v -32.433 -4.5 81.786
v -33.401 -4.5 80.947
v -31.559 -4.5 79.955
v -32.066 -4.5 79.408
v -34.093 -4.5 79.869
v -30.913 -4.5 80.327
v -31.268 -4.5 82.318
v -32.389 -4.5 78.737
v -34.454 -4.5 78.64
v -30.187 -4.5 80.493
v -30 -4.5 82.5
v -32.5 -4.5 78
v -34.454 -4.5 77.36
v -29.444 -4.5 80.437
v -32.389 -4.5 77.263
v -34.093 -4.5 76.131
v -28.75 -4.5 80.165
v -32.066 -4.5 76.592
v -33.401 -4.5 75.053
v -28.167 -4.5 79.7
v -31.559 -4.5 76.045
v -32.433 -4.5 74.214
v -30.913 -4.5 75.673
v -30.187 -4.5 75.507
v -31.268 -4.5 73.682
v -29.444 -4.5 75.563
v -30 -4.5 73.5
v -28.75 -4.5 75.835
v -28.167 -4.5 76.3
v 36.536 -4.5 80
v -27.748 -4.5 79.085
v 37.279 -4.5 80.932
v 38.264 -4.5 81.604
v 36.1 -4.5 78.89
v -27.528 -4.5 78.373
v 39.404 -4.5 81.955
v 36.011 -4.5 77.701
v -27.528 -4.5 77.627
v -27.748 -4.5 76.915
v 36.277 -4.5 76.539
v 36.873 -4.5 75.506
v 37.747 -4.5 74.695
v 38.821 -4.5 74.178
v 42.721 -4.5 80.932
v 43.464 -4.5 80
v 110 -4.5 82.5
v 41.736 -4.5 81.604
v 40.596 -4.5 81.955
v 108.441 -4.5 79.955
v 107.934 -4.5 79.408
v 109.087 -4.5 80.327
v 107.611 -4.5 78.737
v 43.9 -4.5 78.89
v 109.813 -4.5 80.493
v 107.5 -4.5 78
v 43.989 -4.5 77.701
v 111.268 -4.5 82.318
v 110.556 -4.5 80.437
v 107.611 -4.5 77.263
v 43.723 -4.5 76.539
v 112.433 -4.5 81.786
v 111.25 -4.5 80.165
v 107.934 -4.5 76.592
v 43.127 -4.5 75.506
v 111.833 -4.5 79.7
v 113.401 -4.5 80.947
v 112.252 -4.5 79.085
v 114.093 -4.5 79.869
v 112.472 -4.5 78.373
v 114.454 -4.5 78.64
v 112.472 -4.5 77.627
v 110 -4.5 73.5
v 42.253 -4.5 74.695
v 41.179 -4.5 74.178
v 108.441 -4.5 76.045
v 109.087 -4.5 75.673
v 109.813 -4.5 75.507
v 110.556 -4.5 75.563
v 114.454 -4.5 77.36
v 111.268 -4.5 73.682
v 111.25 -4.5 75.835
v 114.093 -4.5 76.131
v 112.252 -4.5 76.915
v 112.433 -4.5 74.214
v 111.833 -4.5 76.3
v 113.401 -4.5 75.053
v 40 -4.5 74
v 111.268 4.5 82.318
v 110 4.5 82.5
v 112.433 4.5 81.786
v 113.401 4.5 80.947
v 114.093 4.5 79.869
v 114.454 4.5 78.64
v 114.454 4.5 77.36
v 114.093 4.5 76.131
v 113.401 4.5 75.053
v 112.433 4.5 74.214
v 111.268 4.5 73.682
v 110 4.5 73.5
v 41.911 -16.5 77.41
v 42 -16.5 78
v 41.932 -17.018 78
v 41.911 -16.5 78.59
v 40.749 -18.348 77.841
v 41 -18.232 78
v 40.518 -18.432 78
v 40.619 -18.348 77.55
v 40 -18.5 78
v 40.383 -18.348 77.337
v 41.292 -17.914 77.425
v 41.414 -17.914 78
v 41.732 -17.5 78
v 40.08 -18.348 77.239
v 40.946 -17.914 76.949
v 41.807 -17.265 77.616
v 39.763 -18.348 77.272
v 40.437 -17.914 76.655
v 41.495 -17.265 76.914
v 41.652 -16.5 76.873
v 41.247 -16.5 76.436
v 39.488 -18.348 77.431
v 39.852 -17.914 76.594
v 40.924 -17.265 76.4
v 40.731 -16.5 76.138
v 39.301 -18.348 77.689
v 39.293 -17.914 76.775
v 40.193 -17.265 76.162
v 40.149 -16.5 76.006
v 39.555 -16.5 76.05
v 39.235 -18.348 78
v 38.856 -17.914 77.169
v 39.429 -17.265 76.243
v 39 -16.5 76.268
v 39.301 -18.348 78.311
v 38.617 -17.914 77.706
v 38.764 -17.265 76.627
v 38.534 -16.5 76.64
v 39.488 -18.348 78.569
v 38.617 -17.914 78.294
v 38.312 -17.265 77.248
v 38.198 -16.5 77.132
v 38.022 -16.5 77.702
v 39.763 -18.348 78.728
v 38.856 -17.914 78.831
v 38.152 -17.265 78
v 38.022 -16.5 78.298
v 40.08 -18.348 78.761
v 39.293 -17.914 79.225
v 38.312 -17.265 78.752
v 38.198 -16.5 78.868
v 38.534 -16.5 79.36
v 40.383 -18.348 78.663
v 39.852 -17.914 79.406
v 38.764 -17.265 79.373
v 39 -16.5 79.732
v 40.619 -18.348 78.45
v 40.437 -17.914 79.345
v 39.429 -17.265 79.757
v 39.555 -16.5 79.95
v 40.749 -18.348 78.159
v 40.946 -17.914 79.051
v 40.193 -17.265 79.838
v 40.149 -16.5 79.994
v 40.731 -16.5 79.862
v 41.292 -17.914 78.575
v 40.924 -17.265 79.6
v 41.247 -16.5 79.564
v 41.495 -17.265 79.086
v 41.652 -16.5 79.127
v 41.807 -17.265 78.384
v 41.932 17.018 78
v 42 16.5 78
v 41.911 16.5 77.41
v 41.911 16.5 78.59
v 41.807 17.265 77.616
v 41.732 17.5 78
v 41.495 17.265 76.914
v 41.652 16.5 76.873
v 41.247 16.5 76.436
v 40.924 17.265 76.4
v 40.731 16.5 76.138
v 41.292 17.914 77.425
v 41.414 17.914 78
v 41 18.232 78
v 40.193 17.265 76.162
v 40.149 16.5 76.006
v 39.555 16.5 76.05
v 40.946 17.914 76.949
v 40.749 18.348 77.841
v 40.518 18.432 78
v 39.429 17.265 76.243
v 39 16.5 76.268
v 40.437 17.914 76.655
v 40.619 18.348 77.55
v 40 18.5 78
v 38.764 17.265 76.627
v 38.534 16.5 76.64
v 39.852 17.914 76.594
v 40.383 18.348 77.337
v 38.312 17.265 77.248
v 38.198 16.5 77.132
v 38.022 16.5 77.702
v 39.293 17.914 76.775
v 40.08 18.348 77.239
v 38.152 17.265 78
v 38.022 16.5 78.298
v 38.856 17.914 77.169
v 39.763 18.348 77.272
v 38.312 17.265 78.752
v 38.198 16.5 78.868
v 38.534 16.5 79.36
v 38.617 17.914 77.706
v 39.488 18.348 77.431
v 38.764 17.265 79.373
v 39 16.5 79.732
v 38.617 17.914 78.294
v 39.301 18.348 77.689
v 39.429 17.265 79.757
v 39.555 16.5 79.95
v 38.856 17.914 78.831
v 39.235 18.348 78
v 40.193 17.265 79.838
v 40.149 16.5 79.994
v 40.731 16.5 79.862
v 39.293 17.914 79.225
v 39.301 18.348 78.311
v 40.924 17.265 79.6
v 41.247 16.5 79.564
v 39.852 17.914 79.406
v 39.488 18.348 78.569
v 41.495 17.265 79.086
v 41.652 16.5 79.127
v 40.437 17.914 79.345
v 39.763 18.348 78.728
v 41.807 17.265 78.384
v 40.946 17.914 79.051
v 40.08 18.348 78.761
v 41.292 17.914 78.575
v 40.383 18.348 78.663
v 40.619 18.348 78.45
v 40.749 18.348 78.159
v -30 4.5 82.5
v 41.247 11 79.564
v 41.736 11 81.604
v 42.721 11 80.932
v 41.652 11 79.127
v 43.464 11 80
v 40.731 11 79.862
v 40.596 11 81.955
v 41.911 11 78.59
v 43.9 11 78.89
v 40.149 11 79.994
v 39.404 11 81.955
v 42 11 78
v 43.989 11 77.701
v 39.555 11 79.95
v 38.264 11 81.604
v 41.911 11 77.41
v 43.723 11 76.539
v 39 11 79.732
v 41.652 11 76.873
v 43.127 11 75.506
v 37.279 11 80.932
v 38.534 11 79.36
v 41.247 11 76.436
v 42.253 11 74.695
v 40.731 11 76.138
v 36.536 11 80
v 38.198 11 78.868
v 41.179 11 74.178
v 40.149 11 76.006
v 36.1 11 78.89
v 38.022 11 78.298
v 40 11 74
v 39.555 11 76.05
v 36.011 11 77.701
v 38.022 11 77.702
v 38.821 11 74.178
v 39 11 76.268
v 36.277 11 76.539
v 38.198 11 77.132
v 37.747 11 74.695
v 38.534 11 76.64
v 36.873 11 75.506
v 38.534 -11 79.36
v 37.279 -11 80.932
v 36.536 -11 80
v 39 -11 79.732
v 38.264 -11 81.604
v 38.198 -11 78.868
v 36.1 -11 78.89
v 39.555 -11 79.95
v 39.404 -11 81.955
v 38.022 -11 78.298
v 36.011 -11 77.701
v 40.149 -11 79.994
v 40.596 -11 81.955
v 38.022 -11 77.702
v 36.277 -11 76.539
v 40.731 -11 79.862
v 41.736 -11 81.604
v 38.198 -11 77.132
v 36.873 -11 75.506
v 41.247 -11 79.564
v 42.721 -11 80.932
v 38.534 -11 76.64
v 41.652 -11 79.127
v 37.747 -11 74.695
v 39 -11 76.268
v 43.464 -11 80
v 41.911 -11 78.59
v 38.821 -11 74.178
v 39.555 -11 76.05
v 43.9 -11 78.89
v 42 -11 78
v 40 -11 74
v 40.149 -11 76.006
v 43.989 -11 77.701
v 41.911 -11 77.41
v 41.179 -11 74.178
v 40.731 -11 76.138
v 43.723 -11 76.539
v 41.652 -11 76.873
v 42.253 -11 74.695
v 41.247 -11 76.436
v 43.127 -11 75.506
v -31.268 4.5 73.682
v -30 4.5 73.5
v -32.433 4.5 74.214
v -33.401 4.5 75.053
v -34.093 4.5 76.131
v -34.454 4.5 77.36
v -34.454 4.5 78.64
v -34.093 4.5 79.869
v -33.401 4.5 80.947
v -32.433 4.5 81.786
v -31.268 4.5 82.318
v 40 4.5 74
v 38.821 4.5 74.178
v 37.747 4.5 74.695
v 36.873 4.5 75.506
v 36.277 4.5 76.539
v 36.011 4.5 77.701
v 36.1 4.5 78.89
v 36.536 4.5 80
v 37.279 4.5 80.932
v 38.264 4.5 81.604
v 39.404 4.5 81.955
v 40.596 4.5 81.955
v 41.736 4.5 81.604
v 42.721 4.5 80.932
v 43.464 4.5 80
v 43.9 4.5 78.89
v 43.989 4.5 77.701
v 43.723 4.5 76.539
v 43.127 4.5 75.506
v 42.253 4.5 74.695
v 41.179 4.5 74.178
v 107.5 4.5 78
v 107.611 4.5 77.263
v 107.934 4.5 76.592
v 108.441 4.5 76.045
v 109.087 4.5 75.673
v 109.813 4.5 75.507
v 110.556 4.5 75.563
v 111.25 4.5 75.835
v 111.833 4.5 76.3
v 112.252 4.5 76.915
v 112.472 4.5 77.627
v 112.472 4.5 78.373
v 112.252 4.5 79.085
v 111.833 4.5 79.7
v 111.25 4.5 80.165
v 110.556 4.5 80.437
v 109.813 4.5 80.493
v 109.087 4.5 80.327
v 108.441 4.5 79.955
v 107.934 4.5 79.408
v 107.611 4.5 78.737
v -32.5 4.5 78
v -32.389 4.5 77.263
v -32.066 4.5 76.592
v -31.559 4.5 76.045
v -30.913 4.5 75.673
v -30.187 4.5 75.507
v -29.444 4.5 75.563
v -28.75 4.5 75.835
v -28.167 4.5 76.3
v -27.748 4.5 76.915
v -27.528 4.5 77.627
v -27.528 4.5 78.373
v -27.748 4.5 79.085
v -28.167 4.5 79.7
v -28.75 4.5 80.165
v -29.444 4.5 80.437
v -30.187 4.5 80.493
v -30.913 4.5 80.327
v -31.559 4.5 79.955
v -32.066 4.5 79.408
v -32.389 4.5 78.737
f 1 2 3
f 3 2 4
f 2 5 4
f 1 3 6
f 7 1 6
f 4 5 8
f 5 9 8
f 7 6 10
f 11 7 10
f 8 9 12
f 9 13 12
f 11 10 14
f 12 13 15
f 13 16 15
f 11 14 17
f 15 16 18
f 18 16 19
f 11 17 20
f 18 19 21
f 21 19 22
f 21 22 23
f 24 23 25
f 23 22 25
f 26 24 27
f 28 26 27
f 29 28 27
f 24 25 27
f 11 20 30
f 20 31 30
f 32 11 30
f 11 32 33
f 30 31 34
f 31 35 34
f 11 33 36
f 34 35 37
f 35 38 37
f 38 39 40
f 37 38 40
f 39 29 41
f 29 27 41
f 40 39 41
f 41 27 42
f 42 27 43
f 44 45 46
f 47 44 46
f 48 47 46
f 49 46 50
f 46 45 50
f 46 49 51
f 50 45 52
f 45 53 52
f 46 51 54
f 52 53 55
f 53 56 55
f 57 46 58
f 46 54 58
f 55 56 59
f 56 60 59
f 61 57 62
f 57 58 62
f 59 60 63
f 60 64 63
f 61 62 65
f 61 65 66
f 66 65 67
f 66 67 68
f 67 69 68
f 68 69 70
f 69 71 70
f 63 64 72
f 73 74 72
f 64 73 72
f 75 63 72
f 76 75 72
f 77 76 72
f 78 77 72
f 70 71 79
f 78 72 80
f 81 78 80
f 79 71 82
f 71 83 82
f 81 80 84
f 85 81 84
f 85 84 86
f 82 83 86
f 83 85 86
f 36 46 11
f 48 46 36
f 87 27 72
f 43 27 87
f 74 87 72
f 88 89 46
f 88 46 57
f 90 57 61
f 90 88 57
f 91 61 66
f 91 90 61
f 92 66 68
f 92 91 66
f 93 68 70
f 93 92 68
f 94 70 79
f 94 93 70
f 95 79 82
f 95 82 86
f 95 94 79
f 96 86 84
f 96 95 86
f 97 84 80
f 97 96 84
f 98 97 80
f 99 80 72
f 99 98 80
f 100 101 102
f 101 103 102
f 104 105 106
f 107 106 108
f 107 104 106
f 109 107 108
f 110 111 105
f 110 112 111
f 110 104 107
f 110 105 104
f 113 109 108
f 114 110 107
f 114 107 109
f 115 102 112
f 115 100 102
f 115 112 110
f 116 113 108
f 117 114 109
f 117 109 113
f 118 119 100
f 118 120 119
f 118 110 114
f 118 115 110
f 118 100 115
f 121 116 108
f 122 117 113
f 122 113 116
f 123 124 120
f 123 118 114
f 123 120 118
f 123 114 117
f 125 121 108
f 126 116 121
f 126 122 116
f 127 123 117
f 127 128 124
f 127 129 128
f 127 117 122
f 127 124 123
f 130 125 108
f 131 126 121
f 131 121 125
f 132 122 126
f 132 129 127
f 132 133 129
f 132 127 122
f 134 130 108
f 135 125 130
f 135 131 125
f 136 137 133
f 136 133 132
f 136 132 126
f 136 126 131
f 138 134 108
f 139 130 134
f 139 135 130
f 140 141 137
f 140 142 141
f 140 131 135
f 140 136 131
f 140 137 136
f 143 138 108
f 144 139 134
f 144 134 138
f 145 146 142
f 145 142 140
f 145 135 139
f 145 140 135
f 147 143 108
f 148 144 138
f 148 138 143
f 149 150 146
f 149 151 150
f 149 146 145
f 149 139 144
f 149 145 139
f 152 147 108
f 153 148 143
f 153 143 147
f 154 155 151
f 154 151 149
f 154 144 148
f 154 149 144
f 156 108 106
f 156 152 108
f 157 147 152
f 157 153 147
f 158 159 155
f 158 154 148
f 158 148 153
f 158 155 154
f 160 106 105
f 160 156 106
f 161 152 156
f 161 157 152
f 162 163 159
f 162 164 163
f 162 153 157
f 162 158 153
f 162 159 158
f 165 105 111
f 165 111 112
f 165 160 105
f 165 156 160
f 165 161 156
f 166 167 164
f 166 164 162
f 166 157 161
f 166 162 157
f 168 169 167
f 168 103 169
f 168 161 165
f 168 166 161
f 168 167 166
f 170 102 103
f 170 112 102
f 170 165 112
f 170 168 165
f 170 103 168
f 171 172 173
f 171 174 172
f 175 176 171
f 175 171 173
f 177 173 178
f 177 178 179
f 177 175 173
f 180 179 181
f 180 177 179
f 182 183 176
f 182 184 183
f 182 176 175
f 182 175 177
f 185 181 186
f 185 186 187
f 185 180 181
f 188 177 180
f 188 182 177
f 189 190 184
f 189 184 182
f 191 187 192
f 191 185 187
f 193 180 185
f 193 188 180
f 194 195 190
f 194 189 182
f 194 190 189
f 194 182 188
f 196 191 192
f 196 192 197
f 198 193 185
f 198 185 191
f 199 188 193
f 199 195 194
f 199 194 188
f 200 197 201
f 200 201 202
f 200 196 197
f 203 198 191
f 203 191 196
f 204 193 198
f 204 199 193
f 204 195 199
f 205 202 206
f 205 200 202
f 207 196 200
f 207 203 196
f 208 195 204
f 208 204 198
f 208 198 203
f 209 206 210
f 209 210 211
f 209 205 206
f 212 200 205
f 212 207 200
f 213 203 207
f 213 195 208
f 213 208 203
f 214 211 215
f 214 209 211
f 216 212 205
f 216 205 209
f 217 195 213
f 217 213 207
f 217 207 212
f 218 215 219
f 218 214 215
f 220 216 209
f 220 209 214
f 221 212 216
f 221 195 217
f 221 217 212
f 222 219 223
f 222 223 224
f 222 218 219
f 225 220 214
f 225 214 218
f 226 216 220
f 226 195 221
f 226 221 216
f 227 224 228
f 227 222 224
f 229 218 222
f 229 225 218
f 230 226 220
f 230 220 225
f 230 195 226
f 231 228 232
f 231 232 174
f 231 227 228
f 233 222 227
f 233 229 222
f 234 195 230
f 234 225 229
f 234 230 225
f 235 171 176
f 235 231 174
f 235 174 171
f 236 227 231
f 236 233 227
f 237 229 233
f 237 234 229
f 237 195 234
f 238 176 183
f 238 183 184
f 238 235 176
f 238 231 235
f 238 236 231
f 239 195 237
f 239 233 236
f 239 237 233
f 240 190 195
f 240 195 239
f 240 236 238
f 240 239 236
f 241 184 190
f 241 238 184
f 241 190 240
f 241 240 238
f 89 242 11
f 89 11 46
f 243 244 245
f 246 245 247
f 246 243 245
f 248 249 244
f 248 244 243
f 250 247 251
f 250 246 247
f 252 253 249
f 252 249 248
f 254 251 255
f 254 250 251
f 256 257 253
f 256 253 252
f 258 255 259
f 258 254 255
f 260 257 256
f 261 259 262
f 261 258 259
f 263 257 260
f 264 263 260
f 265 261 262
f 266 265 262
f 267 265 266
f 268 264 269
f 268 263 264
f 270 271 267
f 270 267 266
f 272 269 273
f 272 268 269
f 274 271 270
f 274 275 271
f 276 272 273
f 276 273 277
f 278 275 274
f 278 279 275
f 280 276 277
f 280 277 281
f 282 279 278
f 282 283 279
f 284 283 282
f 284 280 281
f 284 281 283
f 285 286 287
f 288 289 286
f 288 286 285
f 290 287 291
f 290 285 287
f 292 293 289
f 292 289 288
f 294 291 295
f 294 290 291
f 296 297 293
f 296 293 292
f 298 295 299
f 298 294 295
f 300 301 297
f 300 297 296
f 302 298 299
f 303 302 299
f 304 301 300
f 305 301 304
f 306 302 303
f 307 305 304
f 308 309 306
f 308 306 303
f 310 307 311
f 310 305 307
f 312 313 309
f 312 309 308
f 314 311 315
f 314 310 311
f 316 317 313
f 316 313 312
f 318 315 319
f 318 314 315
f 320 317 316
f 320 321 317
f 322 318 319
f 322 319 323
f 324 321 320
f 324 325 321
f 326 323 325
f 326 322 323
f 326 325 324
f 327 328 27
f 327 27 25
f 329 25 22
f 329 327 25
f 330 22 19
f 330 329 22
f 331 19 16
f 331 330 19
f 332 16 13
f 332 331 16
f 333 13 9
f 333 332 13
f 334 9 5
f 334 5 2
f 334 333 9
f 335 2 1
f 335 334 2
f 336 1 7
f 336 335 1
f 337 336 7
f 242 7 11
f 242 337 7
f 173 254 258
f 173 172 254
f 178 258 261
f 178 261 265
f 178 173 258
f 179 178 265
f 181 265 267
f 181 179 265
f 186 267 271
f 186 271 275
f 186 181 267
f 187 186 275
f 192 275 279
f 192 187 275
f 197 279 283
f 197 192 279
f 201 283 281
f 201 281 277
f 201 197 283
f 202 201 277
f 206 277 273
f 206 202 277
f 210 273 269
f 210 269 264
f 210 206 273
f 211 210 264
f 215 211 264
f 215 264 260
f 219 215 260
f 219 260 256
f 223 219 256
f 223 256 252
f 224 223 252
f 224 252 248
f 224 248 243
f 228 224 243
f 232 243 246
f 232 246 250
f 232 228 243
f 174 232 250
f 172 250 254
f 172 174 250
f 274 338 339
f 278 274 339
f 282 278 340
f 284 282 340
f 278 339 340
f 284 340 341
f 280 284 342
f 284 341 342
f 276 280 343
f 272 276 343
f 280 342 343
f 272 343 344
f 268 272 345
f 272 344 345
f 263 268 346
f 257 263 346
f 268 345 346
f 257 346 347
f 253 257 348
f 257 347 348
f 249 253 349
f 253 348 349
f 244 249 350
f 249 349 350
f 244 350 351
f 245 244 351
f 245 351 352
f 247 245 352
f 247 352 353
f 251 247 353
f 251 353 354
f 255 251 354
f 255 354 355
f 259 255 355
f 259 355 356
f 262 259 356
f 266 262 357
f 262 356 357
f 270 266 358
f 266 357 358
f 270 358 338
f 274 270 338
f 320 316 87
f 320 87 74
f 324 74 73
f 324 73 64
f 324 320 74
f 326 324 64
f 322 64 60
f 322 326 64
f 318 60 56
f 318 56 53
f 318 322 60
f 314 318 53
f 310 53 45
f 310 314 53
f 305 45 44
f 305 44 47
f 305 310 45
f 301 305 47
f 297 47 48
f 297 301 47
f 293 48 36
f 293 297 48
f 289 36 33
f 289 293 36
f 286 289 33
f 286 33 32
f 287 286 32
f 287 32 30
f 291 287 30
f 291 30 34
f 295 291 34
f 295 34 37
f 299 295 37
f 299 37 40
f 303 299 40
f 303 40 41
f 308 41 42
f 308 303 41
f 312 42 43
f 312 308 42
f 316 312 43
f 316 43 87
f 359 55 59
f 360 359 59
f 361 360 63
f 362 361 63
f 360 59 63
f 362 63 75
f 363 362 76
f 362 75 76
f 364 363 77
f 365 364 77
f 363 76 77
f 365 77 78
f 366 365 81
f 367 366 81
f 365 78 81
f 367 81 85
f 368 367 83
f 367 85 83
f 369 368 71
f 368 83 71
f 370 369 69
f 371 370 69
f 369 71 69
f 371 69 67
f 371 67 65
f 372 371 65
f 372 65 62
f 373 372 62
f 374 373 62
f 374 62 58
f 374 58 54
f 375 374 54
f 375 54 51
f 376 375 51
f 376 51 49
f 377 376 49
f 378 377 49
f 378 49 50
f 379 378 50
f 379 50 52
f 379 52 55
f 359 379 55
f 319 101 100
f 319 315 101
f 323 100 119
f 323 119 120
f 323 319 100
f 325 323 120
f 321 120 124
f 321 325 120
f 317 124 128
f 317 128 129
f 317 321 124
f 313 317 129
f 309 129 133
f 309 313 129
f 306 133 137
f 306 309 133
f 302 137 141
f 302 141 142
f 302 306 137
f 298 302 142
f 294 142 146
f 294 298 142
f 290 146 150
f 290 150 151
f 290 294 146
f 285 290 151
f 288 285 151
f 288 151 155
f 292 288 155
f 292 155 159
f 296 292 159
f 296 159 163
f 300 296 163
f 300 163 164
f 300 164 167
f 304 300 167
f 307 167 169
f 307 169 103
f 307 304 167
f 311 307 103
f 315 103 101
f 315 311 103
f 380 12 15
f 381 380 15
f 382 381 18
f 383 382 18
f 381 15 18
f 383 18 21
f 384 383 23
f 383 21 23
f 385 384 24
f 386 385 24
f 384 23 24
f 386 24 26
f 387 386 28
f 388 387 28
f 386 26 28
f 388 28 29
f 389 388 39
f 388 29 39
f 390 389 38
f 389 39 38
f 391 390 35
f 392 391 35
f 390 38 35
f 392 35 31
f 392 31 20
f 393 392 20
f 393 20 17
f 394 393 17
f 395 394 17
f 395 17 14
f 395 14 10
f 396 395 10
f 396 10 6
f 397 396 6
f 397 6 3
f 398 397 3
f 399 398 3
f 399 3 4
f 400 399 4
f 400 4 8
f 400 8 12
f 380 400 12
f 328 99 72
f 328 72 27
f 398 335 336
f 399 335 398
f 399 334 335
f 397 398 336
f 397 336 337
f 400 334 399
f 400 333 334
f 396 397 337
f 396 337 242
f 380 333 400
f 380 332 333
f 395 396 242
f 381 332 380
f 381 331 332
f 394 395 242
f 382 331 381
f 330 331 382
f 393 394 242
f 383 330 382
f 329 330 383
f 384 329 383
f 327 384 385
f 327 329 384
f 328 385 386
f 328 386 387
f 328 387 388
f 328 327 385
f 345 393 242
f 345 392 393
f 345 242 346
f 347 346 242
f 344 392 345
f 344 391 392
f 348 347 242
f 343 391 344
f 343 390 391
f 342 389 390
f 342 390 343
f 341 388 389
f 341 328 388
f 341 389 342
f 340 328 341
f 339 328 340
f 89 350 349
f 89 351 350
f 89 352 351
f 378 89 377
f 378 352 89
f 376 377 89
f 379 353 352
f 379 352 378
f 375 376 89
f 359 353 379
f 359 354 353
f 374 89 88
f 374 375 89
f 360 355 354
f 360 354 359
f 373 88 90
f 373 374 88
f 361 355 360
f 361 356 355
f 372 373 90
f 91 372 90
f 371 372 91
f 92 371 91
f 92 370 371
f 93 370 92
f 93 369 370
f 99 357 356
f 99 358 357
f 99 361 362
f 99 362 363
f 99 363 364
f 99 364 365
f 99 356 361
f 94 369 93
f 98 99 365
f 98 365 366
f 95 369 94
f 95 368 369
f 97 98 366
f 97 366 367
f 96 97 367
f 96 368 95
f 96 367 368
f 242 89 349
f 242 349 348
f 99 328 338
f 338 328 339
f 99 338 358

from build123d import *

# Parameters (mm, degrees)
BOSS_EXTRUDE1_DEPTH          = 9
SKETCH2_R                    = 4
BOSS_EXTRUDE2_DEPTH          = 6.5
BOSS_EXTRUDE4_START          = 6.5
SKETCH4_R                    = 4
BOSS_EXTRUDE4_DEPTH          = 6.5
F_5_0_5_DIAMETER_HOLE1_D     = 5
F_5_0_5_DIAMETER_HOLE1_DEPTH = 23


# Read off the part's stored shape, not the designer's step: Boss-Extrude3, Boss-Extrude5
with BuildPart() as part:
    # Sketch1 → Boss-Extrude1 (new body)
    with BuildSketch(Plane(origin=(0, 4.5, 0), x_dir=(1, 0, 0), z_dir=(0, 1, 0))):
        with BuildLine():
            Line((-30, -82.5), (110, -82.5))
            ThreePointArc((110, -82.5), (114.5, -78), (110, -73.5))
            Line((110, -73.5), (-30, -73.5))
            ThreePointArc((-30, -73.5), (-34.5, -78), (-30, -82.5))
        make_face()
    extrude(amount=-BOSS_EXTRUDE1_DEPTH)

    # Sketch2 → Boss-Extrude2 (add)
    with BuildSketch(Plane(origin=(0, 4.5, 0), x_dir=(-1, 0, 0), z_dir=(0, 1, 0))):
        with Locations(Location((-40, 78, 0), (0, 0, 270))):
            Circle(SKETCH2_R)
    extrude(amount=BOSS_EXTRUDE2_DEPTH)

    # Boss-Extrude3 outline → Boss-Extrude3 (revolve)
    with BuildSketch(Plane(origin=(40, 0, 78), x_dir=(1, 0, 0), z_dir=(0, 0, 1))):
        with BuildLine():
            Line((2, 11), (2, 16.499999998))
            ThreePointArc((2, 16.499999998), (1.414213563, 17.914213562), (0, 18.5))
            Line((0, 18.5), (0, 11))
            Line((0, 11), (2, 11))
        make_face()
    revolve(axis=Axis((40, 0, 78), (0, 1, 0)))

    # Sketch4 → Boss-Extrude4 (add)
    with BuildSketch(Plane.XZ.offset(4.5).offset(BOSS_EXTRUDE4_START)):
        with Locations(Location((40, 78, 0), (0, 0, 270))):
            Circle(SKETCH4_R)
    extrude(amount=-BOSS_EXTRUDE4_DEPTH)

    # Boss-Extrude5 outline → Boss-Extrude5 (revolve)
    with BuildSketch(Plane(origin=(40, 0, 78), x_dir=(1, 0, 0), z_dir=(0, 0, 1))):
        with BuildLine():
            ThreePointArc((0, -18.5), (1.414213563, -17.914213562), (2, -16.499999998))
            Line((2, -16.499999998), (2, -11))
            Line((2, -11), (0, -11))
            Line((0, -11), (0, -18.5))
        make_face()
    revolve(axis=Axis((40, 0, 78), (0, 1, 0)))

    # Ø5.0 (5) Diameter Hole1
    with Locations(Plane(origin=(0, 4.5, 0), x_dir=(1, 0, 0), z_dir=(0, 1, 0))):
        with Locations((-30, -78), (110, -78)):
            Hole(F_5_0_5_DIAMETER_HOLE1_D / 2, depth=F_5_0_5_DIAMETER_HOLE1_DEPTH)


solid = part.part
